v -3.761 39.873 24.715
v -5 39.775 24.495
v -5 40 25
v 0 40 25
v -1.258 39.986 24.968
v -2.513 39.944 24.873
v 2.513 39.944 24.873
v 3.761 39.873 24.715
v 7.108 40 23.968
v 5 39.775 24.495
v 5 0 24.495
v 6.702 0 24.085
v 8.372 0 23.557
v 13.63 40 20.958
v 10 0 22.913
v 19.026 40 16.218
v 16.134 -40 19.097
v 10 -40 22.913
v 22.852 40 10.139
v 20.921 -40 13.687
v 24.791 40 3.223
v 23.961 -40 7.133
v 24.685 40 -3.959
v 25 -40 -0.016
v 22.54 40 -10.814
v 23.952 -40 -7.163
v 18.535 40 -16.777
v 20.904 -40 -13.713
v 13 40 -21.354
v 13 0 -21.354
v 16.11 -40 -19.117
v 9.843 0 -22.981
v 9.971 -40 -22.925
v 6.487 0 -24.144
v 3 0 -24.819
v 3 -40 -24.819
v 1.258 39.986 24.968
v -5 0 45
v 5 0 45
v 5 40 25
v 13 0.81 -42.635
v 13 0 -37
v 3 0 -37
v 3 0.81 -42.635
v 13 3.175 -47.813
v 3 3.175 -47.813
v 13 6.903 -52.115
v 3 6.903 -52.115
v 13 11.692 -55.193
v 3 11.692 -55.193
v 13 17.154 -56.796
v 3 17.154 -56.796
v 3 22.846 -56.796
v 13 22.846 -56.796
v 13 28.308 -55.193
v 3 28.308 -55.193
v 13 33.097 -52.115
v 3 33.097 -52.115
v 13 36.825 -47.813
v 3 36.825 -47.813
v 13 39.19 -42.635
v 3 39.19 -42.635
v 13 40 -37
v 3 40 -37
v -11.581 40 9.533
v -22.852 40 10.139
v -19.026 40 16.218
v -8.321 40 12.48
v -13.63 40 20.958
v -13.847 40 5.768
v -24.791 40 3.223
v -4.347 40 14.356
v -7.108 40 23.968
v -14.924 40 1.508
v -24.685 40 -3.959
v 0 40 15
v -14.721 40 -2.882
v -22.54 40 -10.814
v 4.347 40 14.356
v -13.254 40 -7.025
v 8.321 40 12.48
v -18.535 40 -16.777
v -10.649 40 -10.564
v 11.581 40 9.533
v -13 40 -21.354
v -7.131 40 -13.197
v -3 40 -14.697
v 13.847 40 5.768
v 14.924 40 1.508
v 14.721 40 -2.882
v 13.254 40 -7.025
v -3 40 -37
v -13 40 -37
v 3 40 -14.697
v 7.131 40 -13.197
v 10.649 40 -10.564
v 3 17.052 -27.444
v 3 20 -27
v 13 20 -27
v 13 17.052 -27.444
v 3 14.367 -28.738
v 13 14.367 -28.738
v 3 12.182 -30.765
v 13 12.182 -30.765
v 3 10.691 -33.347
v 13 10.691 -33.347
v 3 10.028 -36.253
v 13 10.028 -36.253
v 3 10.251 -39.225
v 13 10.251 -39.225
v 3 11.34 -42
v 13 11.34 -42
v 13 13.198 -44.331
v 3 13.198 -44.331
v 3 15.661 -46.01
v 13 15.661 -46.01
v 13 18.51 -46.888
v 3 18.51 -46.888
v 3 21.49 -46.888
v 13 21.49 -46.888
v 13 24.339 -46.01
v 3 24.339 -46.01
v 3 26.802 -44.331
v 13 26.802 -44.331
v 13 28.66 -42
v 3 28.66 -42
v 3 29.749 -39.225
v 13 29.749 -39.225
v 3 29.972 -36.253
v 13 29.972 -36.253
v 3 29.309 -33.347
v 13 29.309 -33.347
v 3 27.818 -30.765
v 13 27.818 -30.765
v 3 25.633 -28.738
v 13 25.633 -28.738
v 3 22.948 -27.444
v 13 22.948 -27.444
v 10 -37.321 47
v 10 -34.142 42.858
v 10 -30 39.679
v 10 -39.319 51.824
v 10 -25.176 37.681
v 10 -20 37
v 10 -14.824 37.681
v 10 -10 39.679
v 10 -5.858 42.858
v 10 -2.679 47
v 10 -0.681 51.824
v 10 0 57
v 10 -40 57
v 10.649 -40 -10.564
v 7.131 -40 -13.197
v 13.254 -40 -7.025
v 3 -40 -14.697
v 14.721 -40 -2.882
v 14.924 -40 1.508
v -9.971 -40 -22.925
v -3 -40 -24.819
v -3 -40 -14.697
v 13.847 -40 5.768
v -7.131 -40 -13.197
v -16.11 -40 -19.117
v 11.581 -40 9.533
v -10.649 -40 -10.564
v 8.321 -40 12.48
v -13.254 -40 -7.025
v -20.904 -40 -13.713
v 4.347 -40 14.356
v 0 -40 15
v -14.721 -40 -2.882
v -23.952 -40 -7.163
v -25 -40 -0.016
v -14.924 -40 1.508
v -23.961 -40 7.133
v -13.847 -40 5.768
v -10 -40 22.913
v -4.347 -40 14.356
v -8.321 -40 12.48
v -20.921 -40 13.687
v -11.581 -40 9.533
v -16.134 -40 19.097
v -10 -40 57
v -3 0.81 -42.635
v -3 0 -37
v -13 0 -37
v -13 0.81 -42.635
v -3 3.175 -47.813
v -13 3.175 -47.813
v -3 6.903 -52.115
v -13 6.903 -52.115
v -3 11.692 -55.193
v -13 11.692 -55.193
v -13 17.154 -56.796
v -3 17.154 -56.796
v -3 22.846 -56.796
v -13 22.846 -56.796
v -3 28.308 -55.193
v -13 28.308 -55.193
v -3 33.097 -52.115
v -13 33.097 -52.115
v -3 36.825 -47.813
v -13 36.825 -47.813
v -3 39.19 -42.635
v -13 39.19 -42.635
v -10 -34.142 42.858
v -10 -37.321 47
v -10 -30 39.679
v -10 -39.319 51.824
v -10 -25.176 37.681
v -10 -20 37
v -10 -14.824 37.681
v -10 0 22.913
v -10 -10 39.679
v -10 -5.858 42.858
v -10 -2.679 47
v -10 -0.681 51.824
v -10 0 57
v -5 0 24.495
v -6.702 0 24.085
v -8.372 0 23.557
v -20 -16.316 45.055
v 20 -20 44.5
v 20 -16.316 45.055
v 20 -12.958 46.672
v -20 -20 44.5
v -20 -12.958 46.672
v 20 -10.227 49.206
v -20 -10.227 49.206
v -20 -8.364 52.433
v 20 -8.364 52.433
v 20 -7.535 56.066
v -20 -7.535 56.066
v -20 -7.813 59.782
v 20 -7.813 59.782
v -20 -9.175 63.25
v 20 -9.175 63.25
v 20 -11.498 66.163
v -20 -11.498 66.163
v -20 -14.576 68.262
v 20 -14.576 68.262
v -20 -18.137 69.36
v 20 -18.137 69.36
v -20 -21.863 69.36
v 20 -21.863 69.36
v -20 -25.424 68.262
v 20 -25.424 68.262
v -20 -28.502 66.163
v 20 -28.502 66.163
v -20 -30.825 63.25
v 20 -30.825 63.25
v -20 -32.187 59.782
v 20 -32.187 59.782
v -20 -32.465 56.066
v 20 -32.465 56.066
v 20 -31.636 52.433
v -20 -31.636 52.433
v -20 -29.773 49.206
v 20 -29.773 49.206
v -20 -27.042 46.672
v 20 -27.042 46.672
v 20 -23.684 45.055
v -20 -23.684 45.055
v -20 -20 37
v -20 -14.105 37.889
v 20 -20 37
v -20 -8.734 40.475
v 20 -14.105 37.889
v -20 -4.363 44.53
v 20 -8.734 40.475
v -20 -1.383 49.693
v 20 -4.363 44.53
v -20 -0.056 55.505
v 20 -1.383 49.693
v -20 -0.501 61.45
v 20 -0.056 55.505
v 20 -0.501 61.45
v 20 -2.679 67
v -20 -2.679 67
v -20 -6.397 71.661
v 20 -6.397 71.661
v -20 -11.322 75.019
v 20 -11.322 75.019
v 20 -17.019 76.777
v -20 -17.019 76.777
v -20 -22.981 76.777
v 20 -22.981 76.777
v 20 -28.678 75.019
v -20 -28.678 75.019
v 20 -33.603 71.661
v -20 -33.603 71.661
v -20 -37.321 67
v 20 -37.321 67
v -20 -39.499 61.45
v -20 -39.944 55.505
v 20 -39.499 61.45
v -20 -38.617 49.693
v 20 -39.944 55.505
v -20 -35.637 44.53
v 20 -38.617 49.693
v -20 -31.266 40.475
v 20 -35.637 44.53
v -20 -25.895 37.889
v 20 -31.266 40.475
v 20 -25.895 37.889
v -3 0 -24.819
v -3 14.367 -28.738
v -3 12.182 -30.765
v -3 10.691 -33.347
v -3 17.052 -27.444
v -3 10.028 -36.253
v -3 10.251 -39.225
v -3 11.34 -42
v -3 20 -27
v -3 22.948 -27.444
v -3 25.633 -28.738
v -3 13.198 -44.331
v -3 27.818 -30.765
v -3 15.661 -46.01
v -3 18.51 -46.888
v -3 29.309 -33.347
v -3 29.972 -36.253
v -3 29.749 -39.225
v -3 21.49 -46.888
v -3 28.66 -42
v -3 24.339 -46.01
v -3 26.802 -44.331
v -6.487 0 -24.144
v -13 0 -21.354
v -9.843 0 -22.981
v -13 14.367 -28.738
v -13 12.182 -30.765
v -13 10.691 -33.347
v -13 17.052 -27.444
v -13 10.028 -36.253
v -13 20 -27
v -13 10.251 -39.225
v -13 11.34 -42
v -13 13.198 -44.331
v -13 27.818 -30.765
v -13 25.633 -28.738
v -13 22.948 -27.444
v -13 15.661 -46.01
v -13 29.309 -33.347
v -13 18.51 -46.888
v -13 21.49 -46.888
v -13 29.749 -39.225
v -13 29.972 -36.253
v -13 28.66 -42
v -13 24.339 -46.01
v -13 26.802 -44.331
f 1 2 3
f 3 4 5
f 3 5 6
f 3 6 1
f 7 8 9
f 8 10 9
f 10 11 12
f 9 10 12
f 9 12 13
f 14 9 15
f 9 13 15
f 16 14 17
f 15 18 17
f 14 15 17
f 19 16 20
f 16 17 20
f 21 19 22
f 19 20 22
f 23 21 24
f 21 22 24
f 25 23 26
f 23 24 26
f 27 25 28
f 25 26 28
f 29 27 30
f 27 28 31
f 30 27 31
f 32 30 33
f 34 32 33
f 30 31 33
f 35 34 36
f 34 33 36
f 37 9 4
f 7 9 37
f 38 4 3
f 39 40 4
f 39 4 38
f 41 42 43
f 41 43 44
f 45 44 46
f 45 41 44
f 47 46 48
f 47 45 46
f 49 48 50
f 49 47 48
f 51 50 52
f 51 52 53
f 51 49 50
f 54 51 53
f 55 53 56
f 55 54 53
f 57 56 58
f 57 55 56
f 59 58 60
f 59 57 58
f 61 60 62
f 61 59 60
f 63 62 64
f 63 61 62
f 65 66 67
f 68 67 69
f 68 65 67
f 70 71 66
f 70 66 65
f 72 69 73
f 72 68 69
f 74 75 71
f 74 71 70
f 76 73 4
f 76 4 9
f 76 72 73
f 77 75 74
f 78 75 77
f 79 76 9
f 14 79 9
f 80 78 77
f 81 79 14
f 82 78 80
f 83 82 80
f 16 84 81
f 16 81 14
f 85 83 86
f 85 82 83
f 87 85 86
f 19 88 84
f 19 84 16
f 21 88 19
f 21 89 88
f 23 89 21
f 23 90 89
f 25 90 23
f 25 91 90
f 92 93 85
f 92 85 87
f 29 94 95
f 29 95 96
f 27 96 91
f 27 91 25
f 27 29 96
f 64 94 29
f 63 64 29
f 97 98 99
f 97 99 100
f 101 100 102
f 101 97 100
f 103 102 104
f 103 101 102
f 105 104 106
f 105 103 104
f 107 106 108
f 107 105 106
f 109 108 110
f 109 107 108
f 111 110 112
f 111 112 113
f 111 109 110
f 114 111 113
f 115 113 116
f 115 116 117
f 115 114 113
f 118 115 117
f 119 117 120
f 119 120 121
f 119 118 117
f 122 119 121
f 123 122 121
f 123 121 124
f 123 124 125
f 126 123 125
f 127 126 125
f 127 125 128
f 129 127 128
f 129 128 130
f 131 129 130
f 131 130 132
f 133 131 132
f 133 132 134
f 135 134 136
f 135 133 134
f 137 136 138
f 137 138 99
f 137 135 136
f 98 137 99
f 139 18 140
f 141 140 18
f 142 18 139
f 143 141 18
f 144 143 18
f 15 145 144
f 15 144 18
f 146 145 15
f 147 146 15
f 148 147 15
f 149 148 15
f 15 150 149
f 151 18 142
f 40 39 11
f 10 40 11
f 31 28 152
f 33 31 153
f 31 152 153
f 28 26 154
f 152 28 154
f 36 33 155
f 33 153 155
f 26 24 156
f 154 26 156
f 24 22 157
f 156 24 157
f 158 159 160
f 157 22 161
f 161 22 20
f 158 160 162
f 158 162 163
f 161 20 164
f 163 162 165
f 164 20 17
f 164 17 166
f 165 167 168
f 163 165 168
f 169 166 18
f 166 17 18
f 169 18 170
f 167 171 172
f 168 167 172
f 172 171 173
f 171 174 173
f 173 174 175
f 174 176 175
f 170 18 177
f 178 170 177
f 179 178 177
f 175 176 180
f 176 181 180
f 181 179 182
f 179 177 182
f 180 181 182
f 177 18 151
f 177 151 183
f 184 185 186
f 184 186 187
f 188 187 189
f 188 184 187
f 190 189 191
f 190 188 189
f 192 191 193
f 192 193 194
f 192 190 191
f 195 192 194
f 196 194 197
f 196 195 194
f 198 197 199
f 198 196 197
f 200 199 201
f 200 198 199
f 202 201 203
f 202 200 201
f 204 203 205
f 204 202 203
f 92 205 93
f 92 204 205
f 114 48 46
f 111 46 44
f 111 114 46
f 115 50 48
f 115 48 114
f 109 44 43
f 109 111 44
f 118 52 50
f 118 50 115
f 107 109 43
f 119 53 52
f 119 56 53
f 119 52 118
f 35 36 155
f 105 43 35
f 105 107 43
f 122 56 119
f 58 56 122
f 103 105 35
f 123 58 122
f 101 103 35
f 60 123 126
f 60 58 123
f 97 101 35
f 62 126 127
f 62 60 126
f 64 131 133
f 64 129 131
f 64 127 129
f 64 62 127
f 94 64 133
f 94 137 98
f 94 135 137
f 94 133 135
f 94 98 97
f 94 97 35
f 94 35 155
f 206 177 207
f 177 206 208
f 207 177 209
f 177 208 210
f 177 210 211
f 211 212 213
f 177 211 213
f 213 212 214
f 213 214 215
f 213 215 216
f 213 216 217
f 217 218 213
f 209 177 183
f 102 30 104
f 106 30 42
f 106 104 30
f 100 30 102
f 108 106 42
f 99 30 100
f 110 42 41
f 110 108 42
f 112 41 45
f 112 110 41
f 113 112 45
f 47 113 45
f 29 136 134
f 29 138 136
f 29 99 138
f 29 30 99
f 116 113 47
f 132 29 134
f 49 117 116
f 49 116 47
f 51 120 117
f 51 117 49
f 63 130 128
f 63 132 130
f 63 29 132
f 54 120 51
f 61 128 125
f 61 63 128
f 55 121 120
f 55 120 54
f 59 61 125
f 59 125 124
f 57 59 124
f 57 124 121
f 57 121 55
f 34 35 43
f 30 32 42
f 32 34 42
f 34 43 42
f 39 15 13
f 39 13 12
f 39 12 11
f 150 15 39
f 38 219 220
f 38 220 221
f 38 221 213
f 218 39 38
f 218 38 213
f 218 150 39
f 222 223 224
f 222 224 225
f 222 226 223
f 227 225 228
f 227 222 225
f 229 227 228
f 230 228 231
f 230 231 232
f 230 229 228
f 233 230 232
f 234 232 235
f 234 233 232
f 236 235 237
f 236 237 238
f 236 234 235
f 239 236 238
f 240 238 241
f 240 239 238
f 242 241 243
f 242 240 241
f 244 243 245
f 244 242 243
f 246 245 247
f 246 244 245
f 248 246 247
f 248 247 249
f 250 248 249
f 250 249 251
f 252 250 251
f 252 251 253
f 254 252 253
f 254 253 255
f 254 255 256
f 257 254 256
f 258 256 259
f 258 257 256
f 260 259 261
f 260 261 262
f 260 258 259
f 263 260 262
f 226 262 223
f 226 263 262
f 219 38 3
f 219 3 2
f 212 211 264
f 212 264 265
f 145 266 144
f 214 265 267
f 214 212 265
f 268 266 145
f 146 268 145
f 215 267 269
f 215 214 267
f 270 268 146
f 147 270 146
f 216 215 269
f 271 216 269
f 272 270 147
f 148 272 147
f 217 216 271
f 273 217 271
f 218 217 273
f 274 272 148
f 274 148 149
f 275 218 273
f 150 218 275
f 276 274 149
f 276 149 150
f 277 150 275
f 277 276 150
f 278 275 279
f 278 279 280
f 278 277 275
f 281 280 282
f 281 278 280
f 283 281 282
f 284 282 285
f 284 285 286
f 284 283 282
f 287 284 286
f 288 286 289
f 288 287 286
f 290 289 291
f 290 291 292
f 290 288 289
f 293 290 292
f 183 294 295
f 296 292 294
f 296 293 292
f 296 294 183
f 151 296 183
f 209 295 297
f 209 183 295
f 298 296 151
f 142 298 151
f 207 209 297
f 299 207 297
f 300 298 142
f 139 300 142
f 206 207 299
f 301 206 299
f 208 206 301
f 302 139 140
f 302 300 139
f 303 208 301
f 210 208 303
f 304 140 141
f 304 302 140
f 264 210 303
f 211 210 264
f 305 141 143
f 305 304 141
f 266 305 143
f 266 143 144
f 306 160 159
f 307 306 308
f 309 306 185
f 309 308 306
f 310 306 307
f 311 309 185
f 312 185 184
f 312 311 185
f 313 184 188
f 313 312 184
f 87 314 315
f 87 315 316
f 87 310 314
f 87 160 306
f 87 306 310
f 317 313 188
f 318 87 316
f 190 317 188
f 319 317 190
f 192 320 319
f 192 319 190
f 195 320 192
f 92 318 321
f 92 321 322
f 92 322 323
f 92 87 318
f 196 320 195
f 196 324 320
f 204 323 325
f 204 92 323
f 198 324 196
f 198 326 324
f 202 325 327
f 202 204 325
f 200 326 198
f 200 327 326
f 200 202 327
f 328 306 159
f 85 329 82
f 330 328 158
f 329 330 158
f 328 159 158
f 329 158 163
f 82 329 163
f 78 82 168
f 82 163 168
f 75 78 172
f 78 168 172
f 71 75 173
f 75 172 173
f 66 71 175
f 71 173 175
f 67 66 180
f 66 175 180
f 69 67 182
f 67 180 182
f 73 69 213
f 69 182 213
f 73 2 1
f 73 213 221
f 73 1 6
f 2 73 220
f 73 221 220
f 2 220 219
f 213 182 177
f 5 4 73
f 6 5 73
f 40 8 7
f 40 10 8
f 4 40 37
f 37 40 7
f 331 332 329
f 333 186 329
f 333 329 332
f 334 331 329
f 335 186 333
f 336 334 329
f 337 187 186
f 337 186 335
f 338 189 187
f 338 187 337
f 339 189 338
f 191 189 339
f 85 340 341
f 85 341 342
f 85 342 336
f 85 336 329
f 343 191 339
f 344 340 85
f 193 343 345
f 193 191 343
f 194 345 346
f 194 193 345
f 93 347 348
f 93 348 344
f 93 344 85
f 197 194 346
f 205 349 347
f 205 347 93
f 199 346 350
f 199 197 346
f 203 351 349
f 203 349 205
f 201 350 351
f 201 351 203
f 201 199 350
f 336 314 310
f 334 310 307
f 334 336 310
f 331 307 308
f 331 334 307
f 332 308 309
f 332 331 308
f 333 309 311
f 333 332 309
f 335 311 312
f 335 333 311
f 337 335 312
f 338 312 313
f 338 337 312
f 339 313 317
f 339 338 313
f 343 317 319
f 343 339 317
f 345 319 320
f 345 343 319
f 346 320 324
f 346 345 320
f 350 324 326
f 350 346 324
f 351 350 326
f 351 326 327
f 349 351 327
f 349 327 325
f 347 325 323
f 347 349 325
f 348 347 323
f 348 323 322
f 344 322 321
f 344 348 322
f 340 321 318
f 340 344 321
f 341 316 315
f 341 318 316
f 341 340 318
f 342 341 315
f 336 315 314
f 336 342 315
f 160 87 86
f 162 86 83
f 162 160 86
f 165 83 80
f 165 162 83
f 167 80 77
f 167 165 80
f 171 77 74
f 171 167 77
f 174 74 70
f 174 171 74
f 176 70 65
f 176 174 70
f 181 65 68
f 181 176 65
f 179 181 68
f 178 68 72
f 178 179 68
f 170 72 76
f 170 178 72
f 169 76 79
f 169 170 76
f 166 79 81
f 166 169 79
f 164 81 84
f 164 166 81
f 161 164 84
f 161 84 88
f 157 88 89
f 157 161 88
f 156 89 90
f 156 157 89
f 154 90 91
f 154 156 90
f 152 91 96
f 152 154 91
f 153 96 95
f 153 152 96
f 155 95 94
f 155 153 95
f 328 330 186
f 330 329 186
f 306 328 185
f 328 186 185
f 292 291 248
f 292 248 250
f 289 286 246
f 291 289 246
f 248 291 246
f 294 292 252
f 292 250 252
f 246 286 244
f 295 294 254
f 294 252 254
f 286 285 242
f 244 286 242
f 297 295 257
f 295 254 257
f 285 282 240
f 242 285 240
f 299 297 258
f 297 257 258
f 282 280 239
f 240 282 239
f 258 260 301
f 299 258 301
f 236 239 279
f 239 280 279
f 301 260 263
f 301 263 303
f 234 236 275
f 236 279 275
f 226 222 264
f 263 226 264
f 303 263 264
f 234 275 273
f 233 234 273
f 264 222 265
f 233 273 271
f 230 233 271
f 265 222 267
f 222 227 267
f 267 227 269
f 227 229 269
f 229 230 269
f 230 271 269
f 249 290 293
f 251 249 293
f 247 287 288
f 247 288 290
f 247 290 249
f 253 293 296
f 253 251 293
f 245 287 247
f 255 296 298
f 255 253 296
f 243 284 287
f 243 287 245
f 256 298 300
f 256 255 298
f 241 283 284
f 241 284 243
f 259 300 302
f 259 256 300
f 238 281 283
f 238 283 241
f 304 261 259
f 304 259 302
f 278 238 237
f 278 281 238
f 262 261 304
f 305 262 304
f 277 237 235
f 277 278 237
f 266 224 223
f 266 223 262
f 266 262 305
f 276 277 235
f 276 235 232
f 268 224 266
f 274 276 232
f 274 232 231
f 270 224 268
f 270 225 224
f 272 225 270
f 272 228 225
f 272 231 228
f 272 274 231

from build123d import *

# Parameters (mm, degrees)
BOSS_EXTRUDE1_DEPTH      = 40
BOSS_EXTRUDE1_DEPTH_BACK = 40
SKETCH1_R                = 25
SKETCH1_R_2              = 15
SKETCH2_R                = 10.000000000000002
BOSS_EXTRUDE2_DEPTH      = 13
SKETCH3_W                = 26.000000000000004
SKETCH3_H                = 40
BOSS_EXTRUDE3_DEPTH      = 3.645843
CUT_EXTRUDE1_DEPTH       = 102.36074190730847
BOSS_EXTRUDE4_DEPTH      = 10
SKETCH7_3_R              = 20
SKETCH7_3_R_2            = 12.500000000000002
BOSS_EXTRUDE5_DEPTH      = 20
SKETCH9_W                = 20
SKETCH9_H                = 40
BOSS_EXTRUDE6_DEPTH      = 2.087122
BOSS_EXTRUDE11_DEPTH     = 4.999999999999998


with BuildPart() as part:
    # Sketch1 → Boss-Extrude1 (new, two sides: drawn at the far end of the back side and taken through both)
    with BuildSketch(Plane(origin=(0, 0, 0), x_dir=(1, 0, 0), z_dir=(0, 1, 0)).offset(-BOSS_EXTRUDE1_DEPTH_BACK)):
        with Locations(Location((0, 0, 0), (0, 0, 270))):
            Circle(SKETCH1_R)
        with Locations(Location((0, 0, 0), (0, 0, 270))):
            Circle(SKETCH1_R_2, mode=Mode.SUBTRACT)
    extrude(amount=BOSS_EXTRUDE1_DEPTH + BOSS_EXTRUDE1_DEPTH_BACK)



with BuildPart() as body_2:
    # Sketch2 → Boss-Extrude2 (new, symmetric)
    with BuildSketch(Plane(origin=(0, 0, 0), x_dir=(0, 0, -1), z_dir=(1, 0, 0))):
        with BuildLine():
            Line((37, 40), (25, 40))
            Line((25, 40), (25, 0))
            Line((25, 0), (37, 0))
            ThreePointArc((37, 0), (57, 20), (37, 40))
        make_face()
        with Locations(Location((37, 20, 0), (0, 0, 180))):
            Circle(SKETCH2_R, mode=Mode.SUBTRACT)
    extrude(amount=BOSS_EXTRUDE2_DEPTH, both=True)


with BuildPart() as part_1:
    add(part.part)

    add(body_2.part)  # Boss-Extrude3 merges body 2
    # Sketch3 → Boss-Extrude3 (add)
    with BuildSketch(Plane.XY.offset(-25)):
        with Locations((0, 20)):
            Rectangle(SKETCH3_W, SKETCH3_H)
    extrude(amount=BOSS_EXTRUDE3_DEPTH)

    # Sketch4 → Cut-Extrude1 (cut, through all)
    with BuildSketch(Plane(origin=(0, 40, 0), x_dir=(1, 0, 0), z_dir=(0, 1, 0))):
        Polygon((-3.000000000000038, 151.757178913158), (2.9999999999999623, 151.75717891315796), (3.0000000000000093, -1.388e-14), (-2.999999999999991, -1.388e-14), align=None)
    extrude(amount=-CUT_EXTRUDE1_DEPTH, mode=Mode.SUBTRACT)



with BuildPart() as body_2_2:
    # Sketch7 → Boss-Extrude4 (new, symmetric)
    with BuildSketch(Plane(origin=(0, 0, 0), x_dir=(0, 0, -1), z_dir=(1, 0, 0))):
        with BuildLine():
            Line((-56.99999999999999, -40), (-25, -40))
            Line((-25, -40), (-25, 0))
            Line((-25, 0), (-56.99999999999999, 0))
            ThreePointArc((-56.99999999999999, 0), (-42.85786437626904, -5.857864376269051), (-36.99999999999999, -20))
            ThreePointArc((-36.99999999999999, -20.000000000000004), (-42.85786437626905, -34.14213562373095), (-57, -40))
        make_face()
    extrude(amount=BOSS_EXTRUDE4_DEPTH, both=True)

    # Sketch7<3> → Boss-Extrude5 (add, symmetric)
    with BuildSketch(Plane(origin=(0, 0, 0), x_dir=(0, 0, -1), z_dir=(1, 0, 0))):
        with Locations((-56.99999999999999, -20)):
            Circle(SKETCH7_3_R)
        with Locations((-56.99999999999999, -20)):
            Circle(SKETCH7_3_R_2, mode=Mode.SUBTRACT)
    extrude(amount=BOSS_EXTRUDE5_DEPTH, both=True)


with BuildPart() as part_2:
    add(part_1.part)

    add(body_2_2.part)  # Boss-Extrude6 merges body 2 2
    # Sketch9 → Boss-Extrude6 (add)
    with BuildSketch(Plane(origin=(0, 0, 25), x_dir=(-1, 0, 0), z_dir=(0, 0, -1))):
        with Locations((0, -20)):
            Rectangle(SKETCH9_W, SKETCH9_H)
    extrude(amount=BOSS_EXTRUDE6_DEPTH)

    # Sketch11 → Boss-Extrude11 (add, symmetric)
    with BuildSketch(Plane(origin=(0, 0, 0), x_dir=(0, 0, -1), z_dir=(1, 0, 0))):
        Polygon((-21.615437004072646, -2.0004940029139107), (-21.615437004072646, 38.49074239980155), (-25, 40), (-44.99999999999999, 0), (-44.99999999999999, -2.0004940029139107), align=None)
    extrude(amount=BOSS_EXTRUDE11_DEPTH, both=True)


solid = part_2.part
